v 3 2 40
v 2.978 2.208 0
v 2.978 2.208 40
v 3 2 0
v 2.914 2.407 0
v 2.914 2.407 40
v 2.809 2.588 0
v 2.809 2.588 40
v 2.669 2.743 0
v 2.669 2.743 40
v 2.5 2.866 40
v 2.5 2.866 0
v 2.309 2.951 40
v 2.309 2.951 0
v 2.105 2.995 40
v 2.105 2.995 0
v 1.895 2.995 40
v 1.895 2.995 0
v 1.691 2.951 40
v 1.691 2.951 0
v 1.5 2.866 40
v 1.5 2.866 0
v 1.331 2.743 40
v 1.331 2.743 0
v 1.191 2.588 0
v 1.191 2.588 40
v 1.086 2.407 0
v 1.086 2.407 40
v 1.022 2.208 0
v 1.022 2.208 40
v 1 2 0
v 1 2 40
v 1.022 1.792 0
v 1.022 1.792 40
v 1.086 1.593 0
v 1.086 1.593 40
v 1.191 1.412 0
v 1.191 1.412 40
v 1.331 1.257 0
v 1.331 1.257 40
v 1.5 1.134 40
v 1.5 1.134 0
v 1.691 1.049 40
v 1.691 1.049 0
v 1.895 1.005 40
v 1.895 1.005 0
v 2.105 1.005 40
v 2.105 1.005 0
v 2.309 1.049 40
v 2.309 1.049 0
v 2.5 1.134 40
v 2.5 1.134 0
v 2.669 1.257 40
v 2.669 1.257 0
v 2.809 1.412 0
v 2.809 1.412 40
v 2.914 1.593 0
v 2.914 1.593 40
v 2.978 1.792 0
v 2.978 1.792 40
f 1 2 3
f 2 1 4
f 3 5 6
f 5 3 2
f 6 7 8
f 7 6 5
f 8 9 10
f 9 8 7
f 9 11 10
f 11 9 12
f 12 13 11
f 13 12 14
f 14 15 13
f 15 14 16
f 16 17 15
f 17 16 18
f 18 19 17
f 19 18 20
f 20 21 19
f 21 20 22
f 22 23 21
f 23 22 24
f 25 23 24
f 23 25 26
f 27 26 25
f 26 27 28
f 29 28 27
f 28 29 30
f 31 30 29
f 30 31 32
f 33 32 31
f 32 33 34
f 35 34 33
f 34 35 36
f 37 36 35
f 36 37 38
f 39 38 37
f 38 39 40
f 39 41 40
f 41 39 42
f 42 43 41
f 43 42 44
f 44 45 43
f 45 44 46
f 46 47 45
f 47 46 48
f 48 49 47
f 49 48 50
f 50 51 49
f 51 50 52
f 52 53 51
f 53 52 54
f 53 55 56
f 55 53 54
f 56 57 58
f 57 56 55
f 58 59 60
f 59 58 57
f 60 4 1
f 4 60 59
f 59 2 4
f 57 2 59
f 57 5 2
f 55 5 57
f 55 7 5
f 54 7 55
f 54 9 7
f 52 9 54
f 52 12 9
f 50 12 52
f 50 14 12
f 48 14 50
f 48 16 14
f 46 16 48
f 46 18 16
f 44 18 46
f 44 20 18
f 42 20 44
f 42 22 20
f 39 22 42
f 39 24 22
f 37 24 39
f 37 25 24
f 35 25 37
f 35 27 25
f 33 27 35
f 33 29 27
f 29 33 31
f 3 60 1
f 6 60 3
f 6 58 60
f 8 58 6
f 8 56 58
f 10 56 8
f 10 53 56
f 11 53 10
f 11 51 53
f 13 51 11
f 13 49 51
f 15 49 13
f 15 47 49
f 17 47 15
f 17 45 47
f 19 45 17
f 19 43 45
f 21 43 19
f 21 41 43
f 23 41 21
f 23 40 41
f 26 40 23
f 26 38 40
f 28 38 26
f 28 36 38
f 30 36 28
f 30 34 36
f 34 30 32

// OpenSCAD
// file: base/screw.scad
//Screws
//Version 2.0
//Licence: CC-0
//Author: Remi Sarrailh <remi@madnerd.org>

$fn = 30; //Increase resolution of cylinder

module screw(z=2,screw_z=4,upper=false){
        if(upper){
            translate([0.5,0.5,screw_z]) cube([3,3,z]);
            translate([2,2,0]) cylinder(h=screw_z,r1=1,r2=1);
        } else {
            translate([0.5,0.5,0]) cube([3,3,z]);
            translate([2,2,z]) cylinder(h=screw_z,r1=1,r2=1);
        }      
}

module vertical_screw(y=3,z=2,screw_z=4,upper=false){
    y=y-1;
    for(a=[0:y])
      translate([0,4*a,0])
      screw(z=z,screw_z=screw_z,upper=upper);
}

module horizontal_screw(x=3,z=2,screw_z=4,upper=false){
    x=x-1;  
    for(a=[0:x])  
        translate([4*a,0,0])
        screw(z=z,screw_z=screw_z,upper=upper);
}

//screw(z=2,screw_z=4,upper=false);
//horizontal_screw(x=3,z=2,screw_z=4,upper=true);
//vertical_screw(y=3,z=2,screw_z=4);
// file: base/protos.scad
//Protos
//Version 2.0
//Licence: CC-0
//Author: Remi Sarrailh <remi@madnerd.org>

$fn = 30; //Improve cylinder resolution 

//Move object block by block (4mm)
module move(x=0,y=0,z=0){
    translate([x*4,y*4,z]) children();
}

//Base for panelas/espacios, size are 4mm and hole diameter is 2mm
module protos(z=2){
    difference(){
        cube([4,4,z]);
        translate([2,2,-1])
         cylinder(z*2+1,1.5,1.5);
    }
}

//Rounded corner
//http://forum.openscad.org/rounded-corners-td3843.html
module fillet(r=1, z=2,rotation=0, x=0, y=0) {
    translate([r / 2 + x, r / 2 + y, 0]) 
    rotate(rotation,0,0)
        difference() {
            cube([r + 0.01, r + 0.01, z*2 +1], center = true);

            translate([r/2, r/2, 0])
                cylinder(r = r, h = z*2 +1, center = true);

        }
}

//Protos with round corner
module protos_fillet(z=2,r=1,bottom_left=false,bottom_right=false,top_left=false,top_right=false){
    if(bottom_left){
        difference(){
            protos(z=z);
            fillet(r=r,z=z);
        }
    }
    if(bottom_right){
        difference(){
            protos(z=z);
            fillet(z=z,rotation=90,x=3);
        }
    }
    if(top_left){
        difference(){
            protos(z=z);
            fillet(z=z,rotation=270,y=3);
        }
    }
    
    if(top_right){
        difference(){
            protos(z=z);
            fillet(z=z,rotation=180,x=3,y=3);
        }
    }
}

//protos(z=2);
//protos_fillet(z=2,r=1,bottom_left=true);
// file: base/panelas.scad
//Panelas
//Version 2.0
//Licence: CC-0
//Author: Remi Sarrailh <remi@madnerd.org>

use <protos.scad>
use <block.scad>

module panelas(x=4,y=4,z=2,fillet=true){
    x=x-1; //We started our loop at 0 not 1 so everything will be 1 block too large
    y=y-1;
    for(a=[0:x])
        translate([4*a,0,0])
    for(b=[0:y]) 
        translate([0,4*b,0]) 
        /*fillet management */
        if(a==0 && b==0 && fillet){protos_fillet(z=z,bottom_left=true);}  //Bottom_left
        else if(a==x && b==0 && fillet) {protos_fillet(z=z,bottom_right=true);} //Bottom Right
        else if(a==0 && b==y && fillet) {protos_fillet(z=z,top_left=true);} //Top Left
        else if(a==x && b==y && fillet) {protos_fillet(z=z,top_right=true);} //Top Right
        /*                  */
        else {protos(z=z);};
}

//panelas(x=4,y=4,z=2);
// file: base/espacios.scad
use <protos.scad>

//Espacios 
//Version 2.0
//Licence: CC-0
//Author: Remi Sarrailh <remi@madnerd.org>

module espacios(x=4,y=4,z=2,fillet=true){
    x = x-1;
    y= y-1;
    for(a=[0:x])
        translate([4*a,0,0])
        if(a==0 && fillet) {protos_fillet(z=z,bottom_left=true);}
        else if(a==x && fillet) {protos_fillet(z=z,bottom_right=true);}
        else{protos(z=z);};
    for(a=[1:y]) 
        translate([0,4*a,0]) 
        if(a==y && fillet) {protos_fillet(z=z,top_left=true);}
        else{protos(z=z);}
    for(a=[1:x]) 
        translate([4*a,4*y,0]) 
        if(a==x && fillet) {protos_fillet(z=z,top_right=true);}
        else{protos(z=z);}
    for(a=[1:y-1]) 
        translate([4*x,4*a,0])
        protos(z=z);
        //if(a==x+2 && fillet) {protos_fillet(z=z,top_right=true);}
        //else{protos(z=z);}
}

//espacios(x=4,y=4,z=2);
// file: base/block.scad
//Block
//Version 2.0
//Licence: CC-0
//Author: Remi Sarrailh <remi@madnerd.org>
$fn = 30;
module block(z=2){
    cube([4,4,z]);
}

module block_espacios(x=4,y=4,z=2){
    x = x-1;
    y = y-1;
    z= z+0.05;
    
    for(a=[0:x])
        translate([-0.05,-0.05,0]) //Margin for difference
        translate([4*a,0,-0.05])
        cube(4.1,4.1,z=z);
    if(y >= 1){
        for(a=[1:y]) 
            translate([-0.05,-0.05,0]) //Margin for difference
            translate([0,4*a,-0.05]) 
            cube(4.1,4.1,z=z);
    }
    if(x >= 1){
        for(a=[1:x]) 
            translate([-0.05,-0.05,0]) //Margin for difference
            translate([4*a,4*y,-0.05]) 
            cube(4.1,4.1,z=z);
    }
    if(y >=2){
        for(a=[1:y-1]) 
            translate([-0.05,-0.05,0]) //Margin for difference
            translate([4*x,4*a,-0.05])
            cube(4.1,4.1,z=z);
    }
}

module block_panelas(x=4,y=4,z=2){
    translate([-0.05,-0.05,-0.05]) cube([x*4+0.1,y*4+0.1,z+0.1]);
}

module blocks(x=4,y=4,z=2,fillet=false){
    if(fillet){
        difference(){
            cube([x*4,y*4,z]);
            fillet();
            fillet(x=(x*4-1),z=z,rotation=90);
            fillet(y=(y*4-1),z=z,rotation=270);
            fillet(x=(x*4-1),y=(y*4-1),z=z,rotation=180);
        }
    }else{     
        cube([x*4,y*4,z]);
    }
}

//Rounded corner
//http://forum.openscad.org/rounded-corners-td3843.html
module fillet(r=1, z=2,rotation=0, x=0, y=0) {
    translate([r / 2 + x, r / 2 + y, 0]) 
    rotate(rotation,0,0)
        difference() {
            cube([r + 0.01, r + 0.01, z*2 +1], center = true);

            translate([r/2, r/2, 0])
                cylinder(r = r, h = z*2 +1, center = true);

        }
}

//block_panelas(x=4,y=4,z=2);
block_espacios(x=4,y=4,z=2);


//color("red") block_panelas();
//block_espacios();
// main file
// Base
use <base/block.scad>
use <base/espacios.scad>
use <base/panelas.scad>
use <base/protos.scad>
use <base/screw.scad>


//move(x=1) espacios();

//espacios(x=4,y=4,z=2,fillet=true);

/*
difference(){
    espacios();
    move(x=1) block_espacios(x=2,y=1);
}
*/

//difference(){
//    panelas(x=12,y=12,z=4,fillet=true);
//    move(x=1,y=1) block_panelas(x=10,y=10,z=3);
//}
//block_panelas(x=8,y=8,z=2);

//panelas(x=4,y=4,z=2,fillet=true);
screw(z=0,screw_z=40,upper=false);
//horizontal_screw(x=3,z=2,screw_z=4,upper=false);
//vertical_screw(y=3,z=2,screw_z=4);
